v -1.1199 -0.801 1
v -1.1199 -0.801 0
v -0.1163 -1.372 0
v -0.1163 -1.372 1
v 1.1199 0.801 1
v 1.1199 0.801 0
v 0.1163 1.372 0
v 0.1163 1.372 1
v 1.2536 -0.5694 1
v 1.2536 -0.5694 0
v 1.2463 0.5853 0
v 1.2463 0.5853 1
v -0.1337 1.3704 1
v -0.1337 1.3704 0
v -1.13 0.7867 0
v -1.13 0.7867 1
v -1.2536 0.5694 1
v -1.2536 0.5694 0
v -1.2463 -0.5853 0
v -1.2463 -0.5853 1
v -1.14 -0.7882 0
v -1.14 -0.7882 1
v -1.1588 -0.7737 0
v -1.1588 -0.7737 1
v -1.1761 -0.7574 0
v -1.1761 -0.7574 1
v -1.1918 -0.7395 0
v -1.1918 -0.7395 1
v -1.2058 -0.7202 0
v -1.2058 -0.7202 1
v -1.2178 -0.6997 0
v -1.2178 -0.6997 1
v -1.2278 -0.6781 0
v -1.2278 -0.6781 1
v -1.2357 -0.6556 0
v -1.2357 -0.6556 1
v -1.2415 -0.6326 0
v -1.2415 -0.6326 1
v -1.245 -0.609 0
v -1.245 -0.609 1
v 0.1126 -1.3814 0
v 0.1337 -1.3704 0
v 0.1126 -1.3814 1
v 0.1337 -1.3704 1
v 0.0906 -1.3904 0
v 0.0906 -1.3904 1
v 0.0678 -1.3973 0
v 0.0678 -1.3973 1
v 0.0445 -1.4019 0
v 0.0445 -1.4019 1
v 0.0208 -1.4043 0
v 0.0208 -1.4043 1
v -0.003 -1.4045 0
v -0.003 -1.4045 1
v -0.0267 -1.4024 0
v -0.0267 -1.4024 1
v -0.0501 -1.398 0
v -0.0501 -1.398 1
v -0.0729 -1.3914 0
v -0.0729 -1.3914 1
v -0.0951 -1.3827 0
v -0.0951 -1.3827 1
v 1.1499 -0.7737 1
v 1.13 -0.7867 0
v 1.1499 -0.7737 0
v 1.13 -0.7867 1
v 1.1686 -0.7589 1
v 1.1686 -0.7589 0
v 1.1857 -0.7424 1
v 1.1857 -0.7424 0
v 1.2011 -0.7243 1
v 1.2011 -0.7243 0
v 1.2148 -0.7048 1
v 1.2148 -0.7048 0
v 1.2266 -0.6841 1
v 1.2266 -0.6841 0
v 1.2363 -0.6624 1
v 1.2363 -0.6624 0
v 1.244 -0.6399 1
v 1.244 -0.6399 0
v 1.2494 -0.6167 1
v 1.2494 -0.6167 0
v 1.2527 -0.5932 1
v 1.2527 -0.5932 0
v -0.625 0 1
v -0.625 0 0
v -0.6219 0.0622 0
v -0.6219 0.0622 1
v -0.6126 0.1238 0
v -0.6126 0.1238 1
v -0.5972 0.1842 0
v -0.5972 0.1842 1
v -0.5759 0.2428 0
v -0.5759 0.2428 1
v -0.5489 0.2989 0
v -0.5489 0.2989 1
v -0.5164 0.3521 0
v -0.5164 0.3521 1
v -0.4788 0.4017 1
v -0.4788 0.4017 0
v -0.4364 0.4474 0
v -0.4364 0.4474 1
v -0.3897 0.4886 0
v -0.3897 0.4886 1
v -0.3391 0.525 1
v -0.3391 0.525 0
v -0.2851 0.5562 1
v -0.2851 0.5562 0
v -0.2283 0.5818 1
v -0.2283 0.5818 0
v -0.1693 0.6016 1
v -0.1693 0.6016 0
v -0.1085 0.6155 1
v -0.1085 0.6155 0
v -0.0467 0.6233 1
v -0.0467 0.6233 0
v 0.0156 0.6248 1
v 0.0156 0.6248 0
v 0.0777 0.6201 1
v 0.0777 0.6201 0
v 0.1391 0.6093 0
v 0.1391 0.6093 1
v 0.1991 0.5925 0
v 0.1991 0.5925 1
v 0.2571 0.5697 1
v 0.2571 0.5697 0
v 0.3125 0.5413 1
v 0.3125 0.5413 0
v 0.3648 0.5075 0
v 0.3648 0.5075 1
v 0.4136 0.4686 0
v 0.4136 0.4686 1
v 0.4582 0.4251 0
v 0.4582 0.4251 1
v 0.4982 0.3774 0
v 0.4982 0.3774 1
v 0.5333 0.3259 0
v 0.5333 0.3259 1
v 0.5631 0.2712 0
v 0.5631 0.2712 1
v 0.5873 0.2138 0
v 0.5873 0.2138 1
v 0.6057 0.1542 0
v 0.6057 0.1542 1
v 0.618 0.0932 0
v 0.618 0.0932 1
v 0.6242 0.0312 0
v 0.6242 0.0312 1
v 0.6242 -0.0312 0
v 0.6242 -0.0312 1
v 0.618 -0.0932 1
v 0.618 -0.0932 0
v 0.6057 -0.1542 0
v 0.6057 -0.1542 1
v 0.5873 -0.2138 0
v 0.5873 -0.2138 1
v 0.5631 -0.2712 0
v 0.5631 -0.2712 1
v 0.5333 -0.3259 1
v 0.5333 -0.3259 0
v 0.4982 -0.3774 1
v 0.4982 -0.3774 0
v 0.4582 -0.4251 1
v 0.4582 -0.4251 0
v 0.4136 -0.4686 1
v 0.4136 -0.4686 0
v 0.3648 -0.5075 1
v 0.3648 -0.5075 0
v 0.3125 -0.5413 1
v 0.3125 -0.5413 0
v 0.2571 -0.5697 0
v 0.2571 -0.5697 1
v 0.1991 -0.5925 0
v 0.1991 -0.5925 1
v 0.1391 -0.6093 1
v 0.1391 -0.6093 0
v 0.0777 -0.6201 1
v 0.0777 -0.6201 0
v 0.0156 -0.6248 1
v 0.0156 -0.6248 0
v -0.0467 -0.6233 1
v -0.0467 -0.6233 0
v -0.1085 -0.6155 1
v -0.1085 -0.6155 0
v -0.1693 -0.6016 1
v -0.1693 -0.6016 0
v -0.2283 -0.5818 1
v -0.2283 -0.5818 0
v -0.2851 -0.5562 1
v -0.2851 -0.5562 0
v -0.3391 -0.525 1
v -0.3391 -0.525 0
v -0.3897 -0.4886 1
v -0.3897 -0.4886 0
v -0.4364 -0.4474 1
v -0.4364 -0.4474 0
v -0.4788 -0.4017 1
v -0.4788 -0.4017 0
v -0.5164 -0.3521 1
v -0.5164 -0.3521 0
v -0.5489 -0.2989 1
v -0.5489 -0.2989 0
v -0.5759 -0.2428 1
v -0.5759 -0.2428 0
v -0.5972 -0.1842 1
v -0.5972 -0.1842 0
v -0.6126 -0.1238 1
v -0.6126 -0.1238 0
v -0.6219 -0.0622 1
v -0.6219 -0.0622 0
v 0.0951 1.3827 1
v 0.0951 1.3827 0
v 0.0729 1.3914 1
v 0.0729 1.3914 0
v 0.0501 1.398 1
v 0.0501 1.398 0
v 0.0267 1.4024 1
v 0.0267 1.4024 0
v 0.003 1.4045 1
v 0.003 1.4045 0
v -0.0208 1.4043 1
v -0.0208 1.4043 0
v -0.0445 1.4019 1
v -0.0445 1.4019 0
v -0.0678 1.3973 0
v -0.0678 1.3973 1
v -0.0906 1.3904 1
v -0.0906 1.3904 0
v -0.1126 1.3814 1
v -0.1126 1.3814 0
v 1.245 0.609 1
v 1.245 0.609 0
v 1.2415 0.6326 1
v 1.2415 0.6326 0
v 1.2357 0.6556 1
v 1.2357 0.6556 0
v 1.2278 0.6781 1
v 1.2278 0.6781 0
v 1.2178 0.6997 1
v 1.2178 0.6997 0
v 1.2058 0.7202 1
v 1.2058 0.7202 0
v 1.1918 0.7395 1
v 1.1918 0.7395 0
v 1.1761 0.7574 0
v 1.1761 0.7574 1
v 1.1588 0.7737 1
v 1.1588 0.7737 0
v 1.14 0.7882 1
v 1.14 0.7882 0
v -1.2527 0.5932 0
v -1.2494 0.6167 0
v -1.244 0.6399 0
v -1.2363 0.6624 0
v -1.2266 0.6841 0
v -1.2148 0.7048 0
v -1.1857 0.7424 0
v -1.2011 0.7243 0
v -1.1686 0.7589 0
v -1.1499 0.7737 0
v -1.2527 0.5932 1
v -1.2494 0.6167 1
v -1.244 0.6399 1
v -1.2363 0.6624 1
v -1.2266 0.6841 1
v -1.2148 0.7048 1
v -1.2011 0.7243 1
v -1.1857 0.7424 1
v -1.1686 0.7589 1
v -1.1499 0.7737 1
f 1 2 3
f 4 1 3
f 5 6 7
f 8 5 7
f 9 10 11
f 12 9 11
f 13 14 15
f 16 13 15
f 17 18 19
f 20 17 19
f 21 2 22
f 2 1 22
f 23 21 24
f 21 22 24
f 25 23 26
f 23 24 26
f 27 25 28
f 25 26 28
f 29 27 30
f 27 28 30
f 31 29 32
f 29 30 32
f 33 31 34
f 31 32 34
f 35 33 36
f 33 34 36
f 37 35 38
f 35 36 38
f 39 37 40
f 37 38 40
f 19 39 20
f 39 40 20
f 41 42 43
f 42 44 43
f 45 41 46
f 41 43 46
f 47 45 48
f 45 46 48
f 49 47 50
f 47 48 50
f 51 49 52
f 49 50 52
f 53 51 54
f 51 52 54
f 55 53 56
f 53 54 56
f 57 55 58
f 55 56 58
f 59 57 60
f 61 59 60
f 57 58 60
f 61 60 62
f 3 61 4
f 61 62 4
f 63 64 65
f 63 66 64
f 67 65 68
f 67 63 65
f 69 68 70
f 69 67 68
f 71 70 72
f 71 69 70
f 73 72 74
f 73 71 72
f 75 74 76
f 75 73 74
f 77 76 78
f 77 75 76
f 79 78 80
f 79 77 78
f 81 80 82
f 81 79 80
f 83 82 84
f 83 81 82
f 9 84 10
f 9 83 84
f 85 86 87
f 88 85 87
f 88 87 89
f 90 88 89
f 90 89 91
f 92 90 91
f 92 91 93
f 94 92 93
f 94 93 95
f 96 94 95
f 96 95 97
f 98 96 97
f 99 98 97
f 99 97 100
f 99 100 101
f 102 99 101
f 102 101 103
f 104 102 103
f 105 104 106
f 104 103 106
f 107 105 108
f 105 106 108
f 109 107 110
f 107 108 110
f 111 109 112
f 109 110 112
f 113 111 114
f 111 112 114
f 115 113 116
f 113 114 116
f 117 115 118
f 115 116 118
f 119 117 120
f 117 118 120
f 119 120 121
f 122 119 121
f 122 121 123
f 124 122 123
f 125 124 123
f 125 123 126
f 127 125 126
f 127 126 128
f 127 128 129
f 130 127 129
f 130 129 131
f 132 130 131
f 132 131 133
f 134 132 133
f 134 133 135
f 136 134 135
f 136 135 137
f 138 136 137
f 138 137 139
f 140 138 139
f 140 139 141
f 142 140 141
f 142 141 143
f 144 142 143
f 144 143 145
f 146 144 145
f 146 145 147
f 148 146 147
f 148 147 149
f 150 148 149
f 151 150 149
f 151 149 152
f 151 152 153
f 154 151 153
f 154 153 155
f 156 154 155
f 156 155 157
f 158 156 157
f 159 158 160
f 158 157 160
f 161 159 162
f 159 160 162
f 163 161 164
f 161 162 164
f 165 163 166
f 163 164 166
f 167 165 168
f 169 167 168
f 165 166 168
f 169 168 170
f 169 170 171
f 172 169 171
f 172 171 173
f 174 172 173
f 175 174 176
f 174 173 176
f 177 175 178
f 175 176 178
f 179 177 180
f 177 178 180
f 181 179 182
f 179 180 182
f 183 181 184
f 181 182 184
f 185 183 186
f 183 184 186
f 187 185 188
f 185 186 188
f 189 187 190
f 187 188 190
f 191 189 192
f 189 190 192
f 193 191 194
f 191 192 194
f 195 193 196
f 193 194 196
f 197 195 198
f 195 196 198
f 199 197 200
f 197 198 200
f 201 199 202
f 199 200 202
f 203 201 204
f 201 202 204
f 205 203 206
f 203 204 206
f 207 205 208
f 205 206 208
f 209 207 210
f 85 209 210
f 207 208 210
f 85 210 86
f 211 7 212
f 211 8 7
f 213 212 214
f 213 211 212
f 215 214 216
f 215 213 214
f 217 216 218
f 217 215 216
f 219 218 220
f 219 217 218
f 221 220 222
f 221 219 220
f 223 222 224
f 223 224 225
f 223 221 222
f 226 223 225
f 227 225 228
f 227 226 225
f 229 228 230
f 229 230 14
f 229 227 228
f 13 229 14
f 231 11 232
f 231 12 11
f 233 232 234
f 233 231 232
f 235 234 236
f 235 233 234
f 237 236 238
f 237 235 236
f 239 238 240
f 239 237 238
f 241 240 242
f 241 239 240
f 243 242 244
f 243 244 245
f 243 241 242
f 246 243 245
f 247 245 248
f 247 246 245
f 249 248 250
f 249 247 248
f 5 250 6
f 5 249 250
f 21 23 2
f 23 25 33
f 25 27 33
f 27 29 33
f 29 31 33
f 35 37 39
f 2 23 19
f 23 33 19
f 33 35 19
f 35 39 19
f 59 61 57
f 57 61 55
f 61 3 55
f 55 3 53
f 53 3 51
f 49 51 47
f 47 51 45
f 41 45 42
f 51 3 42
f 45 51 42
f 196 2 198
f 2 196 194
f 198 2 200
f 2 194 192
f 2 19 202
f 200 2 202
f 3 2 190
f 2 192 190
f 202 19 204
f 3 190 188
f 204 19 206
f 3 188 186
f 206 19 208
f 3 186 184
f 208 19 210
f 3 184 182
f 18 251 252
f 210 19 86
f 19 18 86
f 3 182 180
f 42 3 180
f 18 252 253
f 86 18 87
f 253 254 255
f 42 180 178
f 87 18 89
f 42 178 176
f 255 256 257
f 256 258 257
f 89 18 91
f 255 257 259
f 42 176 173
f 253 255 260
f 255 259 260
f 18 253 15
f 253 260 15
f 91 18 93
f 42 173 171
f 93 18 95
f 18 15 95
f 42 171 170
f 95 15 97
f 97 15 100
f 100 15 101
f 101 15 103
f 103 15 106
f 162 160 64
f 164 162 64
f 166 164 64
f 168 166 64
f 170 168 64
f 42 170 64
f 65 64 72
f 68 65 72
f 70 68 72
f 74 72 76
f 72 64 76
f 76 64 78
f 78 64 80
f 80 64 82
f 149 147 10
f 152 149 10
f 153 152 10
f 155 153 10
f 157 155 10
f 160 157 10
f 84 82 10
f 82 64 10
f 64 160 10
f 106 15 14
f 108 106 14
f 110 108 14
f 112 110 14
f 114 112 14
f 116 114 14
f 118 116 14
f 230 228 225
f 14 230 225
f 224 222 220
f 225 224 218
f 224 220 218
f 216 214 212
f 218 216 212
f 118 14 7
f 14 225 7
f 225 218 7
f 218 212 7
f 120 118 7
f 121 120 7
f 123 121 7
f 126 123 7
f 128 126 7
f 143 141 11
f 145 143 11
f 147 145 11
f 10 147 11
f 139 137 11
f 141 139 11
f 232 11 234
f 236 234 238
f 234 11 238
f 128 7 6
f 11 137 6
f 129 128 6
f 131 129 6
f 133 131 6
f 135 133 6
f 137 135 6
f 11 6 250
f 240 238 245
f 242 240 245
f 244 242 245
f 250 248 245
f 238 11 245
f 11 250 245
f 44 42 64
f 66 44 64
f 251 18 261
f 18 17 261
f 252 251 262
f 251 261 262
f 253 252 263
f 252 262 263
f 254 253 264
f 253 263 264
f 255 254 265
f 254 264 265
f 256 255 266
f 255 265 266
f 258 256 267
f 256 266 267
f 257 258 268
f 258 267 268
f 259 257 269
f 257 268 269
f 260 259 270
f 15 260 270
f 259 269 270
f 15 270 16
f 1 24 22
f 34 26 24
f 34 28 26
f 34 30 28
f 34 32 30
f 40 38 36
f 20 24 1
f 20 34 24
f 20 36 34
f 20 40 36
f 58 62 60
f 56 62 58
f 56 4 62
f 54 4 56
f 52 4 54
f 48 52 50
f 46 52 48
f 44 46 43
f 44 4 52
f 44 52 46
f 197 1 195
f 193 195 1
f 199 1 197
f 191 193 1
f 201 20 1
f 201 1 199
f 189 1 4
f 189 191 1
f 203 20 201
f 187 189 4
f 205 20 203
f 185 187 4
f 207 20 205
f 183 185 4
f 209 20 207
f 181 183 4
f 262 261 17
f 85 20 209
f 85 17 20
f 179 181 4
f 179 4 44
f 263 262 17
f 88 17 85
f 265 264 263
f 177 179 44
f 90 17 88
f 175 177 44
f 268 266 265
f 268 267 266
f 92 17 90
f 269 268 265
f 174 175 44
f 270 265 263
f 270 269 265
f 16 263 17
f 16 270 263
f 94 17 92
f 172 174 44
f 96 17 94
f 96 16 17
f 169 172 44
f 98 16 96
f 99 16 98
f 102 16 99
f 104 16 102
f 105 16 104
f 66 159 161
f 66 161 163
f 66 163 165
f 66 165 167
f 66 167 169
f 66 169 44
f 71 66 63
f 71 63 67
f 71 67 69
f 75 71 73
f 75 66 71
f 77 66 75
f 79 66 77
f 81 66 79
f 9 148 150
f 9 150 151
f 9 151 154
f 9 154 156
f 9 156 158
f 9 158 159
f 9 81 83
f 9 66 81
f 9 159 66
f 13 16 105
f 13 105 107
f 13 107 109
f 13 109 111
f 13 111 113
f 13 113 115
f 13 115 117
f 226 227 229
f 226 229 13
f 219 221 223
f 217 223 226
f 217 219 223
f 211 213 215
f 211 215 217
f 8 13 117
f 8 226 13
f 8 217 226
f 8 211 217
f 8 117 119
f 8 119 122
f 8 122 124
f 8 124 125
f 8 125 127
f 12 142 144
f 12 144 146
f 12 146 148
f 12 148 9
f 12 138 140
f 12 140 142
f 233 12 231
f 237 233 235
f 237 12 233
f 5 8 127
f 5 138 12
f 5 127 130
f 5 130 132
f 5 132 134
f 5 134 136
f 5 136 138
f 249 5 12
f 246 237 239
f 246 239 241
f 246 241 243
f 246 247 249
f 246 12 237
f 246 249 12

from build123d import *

# Parameters (mm, degrees)
F1_DEPTH = 4
F3_D     = 5
F3_DEPTH = 10
F3_TIP   = 1.5021515476
F4_R     = 1
F5_SCALE = 0.25


with BuildPart() as f1:
    # F0 (on Top) → F1 (new body)
    with BuildSketch(Plane.XY):
        Polygon((0.0366512368, -5.7733863564), (5.0182248689, -2.8549522761), (4.9815736321, 2.9184340803), (-0.0366512368, 5.7733863564), (-5.0182248689, 2.8549522761), (-4.9815736321, -2.9184340803), align=None)
    extrude(amount=F1_DEPTH)

    # F3
    with Locations(Plane.XY.offset(4)):
        with Locations((0, 0)):
            Hole(F3_D / 2, depth=F3_DEPTH)
            with Locations((0, 0, -(F3_DEPTH + F3_TIP / 2))):  # 118° drill point
                Cone(0, F3_D / 2, F3_TIP, mode=Mode.SUBTRACT)

    # F4
    f4_edges = [f1.edges().sort_by_distance(p)[0] for p in [
        (-5.018225, 2.854952, 2),
        (-0.036651, 5.773386, 2),
        (-4.981574, -2.918434, 2),
        (0.036651, -5.773386, 2),
        (5.018225, -2.854952, 2),
        (4.981574, 2.918434, 2),
    ]]
    fillet(f4_edges, radius=F4_R)


with BuildPart() as f1_1:
    # F5: moved
    add(f1.part.scale(F5_SCALE))


solid = f1_1.part
